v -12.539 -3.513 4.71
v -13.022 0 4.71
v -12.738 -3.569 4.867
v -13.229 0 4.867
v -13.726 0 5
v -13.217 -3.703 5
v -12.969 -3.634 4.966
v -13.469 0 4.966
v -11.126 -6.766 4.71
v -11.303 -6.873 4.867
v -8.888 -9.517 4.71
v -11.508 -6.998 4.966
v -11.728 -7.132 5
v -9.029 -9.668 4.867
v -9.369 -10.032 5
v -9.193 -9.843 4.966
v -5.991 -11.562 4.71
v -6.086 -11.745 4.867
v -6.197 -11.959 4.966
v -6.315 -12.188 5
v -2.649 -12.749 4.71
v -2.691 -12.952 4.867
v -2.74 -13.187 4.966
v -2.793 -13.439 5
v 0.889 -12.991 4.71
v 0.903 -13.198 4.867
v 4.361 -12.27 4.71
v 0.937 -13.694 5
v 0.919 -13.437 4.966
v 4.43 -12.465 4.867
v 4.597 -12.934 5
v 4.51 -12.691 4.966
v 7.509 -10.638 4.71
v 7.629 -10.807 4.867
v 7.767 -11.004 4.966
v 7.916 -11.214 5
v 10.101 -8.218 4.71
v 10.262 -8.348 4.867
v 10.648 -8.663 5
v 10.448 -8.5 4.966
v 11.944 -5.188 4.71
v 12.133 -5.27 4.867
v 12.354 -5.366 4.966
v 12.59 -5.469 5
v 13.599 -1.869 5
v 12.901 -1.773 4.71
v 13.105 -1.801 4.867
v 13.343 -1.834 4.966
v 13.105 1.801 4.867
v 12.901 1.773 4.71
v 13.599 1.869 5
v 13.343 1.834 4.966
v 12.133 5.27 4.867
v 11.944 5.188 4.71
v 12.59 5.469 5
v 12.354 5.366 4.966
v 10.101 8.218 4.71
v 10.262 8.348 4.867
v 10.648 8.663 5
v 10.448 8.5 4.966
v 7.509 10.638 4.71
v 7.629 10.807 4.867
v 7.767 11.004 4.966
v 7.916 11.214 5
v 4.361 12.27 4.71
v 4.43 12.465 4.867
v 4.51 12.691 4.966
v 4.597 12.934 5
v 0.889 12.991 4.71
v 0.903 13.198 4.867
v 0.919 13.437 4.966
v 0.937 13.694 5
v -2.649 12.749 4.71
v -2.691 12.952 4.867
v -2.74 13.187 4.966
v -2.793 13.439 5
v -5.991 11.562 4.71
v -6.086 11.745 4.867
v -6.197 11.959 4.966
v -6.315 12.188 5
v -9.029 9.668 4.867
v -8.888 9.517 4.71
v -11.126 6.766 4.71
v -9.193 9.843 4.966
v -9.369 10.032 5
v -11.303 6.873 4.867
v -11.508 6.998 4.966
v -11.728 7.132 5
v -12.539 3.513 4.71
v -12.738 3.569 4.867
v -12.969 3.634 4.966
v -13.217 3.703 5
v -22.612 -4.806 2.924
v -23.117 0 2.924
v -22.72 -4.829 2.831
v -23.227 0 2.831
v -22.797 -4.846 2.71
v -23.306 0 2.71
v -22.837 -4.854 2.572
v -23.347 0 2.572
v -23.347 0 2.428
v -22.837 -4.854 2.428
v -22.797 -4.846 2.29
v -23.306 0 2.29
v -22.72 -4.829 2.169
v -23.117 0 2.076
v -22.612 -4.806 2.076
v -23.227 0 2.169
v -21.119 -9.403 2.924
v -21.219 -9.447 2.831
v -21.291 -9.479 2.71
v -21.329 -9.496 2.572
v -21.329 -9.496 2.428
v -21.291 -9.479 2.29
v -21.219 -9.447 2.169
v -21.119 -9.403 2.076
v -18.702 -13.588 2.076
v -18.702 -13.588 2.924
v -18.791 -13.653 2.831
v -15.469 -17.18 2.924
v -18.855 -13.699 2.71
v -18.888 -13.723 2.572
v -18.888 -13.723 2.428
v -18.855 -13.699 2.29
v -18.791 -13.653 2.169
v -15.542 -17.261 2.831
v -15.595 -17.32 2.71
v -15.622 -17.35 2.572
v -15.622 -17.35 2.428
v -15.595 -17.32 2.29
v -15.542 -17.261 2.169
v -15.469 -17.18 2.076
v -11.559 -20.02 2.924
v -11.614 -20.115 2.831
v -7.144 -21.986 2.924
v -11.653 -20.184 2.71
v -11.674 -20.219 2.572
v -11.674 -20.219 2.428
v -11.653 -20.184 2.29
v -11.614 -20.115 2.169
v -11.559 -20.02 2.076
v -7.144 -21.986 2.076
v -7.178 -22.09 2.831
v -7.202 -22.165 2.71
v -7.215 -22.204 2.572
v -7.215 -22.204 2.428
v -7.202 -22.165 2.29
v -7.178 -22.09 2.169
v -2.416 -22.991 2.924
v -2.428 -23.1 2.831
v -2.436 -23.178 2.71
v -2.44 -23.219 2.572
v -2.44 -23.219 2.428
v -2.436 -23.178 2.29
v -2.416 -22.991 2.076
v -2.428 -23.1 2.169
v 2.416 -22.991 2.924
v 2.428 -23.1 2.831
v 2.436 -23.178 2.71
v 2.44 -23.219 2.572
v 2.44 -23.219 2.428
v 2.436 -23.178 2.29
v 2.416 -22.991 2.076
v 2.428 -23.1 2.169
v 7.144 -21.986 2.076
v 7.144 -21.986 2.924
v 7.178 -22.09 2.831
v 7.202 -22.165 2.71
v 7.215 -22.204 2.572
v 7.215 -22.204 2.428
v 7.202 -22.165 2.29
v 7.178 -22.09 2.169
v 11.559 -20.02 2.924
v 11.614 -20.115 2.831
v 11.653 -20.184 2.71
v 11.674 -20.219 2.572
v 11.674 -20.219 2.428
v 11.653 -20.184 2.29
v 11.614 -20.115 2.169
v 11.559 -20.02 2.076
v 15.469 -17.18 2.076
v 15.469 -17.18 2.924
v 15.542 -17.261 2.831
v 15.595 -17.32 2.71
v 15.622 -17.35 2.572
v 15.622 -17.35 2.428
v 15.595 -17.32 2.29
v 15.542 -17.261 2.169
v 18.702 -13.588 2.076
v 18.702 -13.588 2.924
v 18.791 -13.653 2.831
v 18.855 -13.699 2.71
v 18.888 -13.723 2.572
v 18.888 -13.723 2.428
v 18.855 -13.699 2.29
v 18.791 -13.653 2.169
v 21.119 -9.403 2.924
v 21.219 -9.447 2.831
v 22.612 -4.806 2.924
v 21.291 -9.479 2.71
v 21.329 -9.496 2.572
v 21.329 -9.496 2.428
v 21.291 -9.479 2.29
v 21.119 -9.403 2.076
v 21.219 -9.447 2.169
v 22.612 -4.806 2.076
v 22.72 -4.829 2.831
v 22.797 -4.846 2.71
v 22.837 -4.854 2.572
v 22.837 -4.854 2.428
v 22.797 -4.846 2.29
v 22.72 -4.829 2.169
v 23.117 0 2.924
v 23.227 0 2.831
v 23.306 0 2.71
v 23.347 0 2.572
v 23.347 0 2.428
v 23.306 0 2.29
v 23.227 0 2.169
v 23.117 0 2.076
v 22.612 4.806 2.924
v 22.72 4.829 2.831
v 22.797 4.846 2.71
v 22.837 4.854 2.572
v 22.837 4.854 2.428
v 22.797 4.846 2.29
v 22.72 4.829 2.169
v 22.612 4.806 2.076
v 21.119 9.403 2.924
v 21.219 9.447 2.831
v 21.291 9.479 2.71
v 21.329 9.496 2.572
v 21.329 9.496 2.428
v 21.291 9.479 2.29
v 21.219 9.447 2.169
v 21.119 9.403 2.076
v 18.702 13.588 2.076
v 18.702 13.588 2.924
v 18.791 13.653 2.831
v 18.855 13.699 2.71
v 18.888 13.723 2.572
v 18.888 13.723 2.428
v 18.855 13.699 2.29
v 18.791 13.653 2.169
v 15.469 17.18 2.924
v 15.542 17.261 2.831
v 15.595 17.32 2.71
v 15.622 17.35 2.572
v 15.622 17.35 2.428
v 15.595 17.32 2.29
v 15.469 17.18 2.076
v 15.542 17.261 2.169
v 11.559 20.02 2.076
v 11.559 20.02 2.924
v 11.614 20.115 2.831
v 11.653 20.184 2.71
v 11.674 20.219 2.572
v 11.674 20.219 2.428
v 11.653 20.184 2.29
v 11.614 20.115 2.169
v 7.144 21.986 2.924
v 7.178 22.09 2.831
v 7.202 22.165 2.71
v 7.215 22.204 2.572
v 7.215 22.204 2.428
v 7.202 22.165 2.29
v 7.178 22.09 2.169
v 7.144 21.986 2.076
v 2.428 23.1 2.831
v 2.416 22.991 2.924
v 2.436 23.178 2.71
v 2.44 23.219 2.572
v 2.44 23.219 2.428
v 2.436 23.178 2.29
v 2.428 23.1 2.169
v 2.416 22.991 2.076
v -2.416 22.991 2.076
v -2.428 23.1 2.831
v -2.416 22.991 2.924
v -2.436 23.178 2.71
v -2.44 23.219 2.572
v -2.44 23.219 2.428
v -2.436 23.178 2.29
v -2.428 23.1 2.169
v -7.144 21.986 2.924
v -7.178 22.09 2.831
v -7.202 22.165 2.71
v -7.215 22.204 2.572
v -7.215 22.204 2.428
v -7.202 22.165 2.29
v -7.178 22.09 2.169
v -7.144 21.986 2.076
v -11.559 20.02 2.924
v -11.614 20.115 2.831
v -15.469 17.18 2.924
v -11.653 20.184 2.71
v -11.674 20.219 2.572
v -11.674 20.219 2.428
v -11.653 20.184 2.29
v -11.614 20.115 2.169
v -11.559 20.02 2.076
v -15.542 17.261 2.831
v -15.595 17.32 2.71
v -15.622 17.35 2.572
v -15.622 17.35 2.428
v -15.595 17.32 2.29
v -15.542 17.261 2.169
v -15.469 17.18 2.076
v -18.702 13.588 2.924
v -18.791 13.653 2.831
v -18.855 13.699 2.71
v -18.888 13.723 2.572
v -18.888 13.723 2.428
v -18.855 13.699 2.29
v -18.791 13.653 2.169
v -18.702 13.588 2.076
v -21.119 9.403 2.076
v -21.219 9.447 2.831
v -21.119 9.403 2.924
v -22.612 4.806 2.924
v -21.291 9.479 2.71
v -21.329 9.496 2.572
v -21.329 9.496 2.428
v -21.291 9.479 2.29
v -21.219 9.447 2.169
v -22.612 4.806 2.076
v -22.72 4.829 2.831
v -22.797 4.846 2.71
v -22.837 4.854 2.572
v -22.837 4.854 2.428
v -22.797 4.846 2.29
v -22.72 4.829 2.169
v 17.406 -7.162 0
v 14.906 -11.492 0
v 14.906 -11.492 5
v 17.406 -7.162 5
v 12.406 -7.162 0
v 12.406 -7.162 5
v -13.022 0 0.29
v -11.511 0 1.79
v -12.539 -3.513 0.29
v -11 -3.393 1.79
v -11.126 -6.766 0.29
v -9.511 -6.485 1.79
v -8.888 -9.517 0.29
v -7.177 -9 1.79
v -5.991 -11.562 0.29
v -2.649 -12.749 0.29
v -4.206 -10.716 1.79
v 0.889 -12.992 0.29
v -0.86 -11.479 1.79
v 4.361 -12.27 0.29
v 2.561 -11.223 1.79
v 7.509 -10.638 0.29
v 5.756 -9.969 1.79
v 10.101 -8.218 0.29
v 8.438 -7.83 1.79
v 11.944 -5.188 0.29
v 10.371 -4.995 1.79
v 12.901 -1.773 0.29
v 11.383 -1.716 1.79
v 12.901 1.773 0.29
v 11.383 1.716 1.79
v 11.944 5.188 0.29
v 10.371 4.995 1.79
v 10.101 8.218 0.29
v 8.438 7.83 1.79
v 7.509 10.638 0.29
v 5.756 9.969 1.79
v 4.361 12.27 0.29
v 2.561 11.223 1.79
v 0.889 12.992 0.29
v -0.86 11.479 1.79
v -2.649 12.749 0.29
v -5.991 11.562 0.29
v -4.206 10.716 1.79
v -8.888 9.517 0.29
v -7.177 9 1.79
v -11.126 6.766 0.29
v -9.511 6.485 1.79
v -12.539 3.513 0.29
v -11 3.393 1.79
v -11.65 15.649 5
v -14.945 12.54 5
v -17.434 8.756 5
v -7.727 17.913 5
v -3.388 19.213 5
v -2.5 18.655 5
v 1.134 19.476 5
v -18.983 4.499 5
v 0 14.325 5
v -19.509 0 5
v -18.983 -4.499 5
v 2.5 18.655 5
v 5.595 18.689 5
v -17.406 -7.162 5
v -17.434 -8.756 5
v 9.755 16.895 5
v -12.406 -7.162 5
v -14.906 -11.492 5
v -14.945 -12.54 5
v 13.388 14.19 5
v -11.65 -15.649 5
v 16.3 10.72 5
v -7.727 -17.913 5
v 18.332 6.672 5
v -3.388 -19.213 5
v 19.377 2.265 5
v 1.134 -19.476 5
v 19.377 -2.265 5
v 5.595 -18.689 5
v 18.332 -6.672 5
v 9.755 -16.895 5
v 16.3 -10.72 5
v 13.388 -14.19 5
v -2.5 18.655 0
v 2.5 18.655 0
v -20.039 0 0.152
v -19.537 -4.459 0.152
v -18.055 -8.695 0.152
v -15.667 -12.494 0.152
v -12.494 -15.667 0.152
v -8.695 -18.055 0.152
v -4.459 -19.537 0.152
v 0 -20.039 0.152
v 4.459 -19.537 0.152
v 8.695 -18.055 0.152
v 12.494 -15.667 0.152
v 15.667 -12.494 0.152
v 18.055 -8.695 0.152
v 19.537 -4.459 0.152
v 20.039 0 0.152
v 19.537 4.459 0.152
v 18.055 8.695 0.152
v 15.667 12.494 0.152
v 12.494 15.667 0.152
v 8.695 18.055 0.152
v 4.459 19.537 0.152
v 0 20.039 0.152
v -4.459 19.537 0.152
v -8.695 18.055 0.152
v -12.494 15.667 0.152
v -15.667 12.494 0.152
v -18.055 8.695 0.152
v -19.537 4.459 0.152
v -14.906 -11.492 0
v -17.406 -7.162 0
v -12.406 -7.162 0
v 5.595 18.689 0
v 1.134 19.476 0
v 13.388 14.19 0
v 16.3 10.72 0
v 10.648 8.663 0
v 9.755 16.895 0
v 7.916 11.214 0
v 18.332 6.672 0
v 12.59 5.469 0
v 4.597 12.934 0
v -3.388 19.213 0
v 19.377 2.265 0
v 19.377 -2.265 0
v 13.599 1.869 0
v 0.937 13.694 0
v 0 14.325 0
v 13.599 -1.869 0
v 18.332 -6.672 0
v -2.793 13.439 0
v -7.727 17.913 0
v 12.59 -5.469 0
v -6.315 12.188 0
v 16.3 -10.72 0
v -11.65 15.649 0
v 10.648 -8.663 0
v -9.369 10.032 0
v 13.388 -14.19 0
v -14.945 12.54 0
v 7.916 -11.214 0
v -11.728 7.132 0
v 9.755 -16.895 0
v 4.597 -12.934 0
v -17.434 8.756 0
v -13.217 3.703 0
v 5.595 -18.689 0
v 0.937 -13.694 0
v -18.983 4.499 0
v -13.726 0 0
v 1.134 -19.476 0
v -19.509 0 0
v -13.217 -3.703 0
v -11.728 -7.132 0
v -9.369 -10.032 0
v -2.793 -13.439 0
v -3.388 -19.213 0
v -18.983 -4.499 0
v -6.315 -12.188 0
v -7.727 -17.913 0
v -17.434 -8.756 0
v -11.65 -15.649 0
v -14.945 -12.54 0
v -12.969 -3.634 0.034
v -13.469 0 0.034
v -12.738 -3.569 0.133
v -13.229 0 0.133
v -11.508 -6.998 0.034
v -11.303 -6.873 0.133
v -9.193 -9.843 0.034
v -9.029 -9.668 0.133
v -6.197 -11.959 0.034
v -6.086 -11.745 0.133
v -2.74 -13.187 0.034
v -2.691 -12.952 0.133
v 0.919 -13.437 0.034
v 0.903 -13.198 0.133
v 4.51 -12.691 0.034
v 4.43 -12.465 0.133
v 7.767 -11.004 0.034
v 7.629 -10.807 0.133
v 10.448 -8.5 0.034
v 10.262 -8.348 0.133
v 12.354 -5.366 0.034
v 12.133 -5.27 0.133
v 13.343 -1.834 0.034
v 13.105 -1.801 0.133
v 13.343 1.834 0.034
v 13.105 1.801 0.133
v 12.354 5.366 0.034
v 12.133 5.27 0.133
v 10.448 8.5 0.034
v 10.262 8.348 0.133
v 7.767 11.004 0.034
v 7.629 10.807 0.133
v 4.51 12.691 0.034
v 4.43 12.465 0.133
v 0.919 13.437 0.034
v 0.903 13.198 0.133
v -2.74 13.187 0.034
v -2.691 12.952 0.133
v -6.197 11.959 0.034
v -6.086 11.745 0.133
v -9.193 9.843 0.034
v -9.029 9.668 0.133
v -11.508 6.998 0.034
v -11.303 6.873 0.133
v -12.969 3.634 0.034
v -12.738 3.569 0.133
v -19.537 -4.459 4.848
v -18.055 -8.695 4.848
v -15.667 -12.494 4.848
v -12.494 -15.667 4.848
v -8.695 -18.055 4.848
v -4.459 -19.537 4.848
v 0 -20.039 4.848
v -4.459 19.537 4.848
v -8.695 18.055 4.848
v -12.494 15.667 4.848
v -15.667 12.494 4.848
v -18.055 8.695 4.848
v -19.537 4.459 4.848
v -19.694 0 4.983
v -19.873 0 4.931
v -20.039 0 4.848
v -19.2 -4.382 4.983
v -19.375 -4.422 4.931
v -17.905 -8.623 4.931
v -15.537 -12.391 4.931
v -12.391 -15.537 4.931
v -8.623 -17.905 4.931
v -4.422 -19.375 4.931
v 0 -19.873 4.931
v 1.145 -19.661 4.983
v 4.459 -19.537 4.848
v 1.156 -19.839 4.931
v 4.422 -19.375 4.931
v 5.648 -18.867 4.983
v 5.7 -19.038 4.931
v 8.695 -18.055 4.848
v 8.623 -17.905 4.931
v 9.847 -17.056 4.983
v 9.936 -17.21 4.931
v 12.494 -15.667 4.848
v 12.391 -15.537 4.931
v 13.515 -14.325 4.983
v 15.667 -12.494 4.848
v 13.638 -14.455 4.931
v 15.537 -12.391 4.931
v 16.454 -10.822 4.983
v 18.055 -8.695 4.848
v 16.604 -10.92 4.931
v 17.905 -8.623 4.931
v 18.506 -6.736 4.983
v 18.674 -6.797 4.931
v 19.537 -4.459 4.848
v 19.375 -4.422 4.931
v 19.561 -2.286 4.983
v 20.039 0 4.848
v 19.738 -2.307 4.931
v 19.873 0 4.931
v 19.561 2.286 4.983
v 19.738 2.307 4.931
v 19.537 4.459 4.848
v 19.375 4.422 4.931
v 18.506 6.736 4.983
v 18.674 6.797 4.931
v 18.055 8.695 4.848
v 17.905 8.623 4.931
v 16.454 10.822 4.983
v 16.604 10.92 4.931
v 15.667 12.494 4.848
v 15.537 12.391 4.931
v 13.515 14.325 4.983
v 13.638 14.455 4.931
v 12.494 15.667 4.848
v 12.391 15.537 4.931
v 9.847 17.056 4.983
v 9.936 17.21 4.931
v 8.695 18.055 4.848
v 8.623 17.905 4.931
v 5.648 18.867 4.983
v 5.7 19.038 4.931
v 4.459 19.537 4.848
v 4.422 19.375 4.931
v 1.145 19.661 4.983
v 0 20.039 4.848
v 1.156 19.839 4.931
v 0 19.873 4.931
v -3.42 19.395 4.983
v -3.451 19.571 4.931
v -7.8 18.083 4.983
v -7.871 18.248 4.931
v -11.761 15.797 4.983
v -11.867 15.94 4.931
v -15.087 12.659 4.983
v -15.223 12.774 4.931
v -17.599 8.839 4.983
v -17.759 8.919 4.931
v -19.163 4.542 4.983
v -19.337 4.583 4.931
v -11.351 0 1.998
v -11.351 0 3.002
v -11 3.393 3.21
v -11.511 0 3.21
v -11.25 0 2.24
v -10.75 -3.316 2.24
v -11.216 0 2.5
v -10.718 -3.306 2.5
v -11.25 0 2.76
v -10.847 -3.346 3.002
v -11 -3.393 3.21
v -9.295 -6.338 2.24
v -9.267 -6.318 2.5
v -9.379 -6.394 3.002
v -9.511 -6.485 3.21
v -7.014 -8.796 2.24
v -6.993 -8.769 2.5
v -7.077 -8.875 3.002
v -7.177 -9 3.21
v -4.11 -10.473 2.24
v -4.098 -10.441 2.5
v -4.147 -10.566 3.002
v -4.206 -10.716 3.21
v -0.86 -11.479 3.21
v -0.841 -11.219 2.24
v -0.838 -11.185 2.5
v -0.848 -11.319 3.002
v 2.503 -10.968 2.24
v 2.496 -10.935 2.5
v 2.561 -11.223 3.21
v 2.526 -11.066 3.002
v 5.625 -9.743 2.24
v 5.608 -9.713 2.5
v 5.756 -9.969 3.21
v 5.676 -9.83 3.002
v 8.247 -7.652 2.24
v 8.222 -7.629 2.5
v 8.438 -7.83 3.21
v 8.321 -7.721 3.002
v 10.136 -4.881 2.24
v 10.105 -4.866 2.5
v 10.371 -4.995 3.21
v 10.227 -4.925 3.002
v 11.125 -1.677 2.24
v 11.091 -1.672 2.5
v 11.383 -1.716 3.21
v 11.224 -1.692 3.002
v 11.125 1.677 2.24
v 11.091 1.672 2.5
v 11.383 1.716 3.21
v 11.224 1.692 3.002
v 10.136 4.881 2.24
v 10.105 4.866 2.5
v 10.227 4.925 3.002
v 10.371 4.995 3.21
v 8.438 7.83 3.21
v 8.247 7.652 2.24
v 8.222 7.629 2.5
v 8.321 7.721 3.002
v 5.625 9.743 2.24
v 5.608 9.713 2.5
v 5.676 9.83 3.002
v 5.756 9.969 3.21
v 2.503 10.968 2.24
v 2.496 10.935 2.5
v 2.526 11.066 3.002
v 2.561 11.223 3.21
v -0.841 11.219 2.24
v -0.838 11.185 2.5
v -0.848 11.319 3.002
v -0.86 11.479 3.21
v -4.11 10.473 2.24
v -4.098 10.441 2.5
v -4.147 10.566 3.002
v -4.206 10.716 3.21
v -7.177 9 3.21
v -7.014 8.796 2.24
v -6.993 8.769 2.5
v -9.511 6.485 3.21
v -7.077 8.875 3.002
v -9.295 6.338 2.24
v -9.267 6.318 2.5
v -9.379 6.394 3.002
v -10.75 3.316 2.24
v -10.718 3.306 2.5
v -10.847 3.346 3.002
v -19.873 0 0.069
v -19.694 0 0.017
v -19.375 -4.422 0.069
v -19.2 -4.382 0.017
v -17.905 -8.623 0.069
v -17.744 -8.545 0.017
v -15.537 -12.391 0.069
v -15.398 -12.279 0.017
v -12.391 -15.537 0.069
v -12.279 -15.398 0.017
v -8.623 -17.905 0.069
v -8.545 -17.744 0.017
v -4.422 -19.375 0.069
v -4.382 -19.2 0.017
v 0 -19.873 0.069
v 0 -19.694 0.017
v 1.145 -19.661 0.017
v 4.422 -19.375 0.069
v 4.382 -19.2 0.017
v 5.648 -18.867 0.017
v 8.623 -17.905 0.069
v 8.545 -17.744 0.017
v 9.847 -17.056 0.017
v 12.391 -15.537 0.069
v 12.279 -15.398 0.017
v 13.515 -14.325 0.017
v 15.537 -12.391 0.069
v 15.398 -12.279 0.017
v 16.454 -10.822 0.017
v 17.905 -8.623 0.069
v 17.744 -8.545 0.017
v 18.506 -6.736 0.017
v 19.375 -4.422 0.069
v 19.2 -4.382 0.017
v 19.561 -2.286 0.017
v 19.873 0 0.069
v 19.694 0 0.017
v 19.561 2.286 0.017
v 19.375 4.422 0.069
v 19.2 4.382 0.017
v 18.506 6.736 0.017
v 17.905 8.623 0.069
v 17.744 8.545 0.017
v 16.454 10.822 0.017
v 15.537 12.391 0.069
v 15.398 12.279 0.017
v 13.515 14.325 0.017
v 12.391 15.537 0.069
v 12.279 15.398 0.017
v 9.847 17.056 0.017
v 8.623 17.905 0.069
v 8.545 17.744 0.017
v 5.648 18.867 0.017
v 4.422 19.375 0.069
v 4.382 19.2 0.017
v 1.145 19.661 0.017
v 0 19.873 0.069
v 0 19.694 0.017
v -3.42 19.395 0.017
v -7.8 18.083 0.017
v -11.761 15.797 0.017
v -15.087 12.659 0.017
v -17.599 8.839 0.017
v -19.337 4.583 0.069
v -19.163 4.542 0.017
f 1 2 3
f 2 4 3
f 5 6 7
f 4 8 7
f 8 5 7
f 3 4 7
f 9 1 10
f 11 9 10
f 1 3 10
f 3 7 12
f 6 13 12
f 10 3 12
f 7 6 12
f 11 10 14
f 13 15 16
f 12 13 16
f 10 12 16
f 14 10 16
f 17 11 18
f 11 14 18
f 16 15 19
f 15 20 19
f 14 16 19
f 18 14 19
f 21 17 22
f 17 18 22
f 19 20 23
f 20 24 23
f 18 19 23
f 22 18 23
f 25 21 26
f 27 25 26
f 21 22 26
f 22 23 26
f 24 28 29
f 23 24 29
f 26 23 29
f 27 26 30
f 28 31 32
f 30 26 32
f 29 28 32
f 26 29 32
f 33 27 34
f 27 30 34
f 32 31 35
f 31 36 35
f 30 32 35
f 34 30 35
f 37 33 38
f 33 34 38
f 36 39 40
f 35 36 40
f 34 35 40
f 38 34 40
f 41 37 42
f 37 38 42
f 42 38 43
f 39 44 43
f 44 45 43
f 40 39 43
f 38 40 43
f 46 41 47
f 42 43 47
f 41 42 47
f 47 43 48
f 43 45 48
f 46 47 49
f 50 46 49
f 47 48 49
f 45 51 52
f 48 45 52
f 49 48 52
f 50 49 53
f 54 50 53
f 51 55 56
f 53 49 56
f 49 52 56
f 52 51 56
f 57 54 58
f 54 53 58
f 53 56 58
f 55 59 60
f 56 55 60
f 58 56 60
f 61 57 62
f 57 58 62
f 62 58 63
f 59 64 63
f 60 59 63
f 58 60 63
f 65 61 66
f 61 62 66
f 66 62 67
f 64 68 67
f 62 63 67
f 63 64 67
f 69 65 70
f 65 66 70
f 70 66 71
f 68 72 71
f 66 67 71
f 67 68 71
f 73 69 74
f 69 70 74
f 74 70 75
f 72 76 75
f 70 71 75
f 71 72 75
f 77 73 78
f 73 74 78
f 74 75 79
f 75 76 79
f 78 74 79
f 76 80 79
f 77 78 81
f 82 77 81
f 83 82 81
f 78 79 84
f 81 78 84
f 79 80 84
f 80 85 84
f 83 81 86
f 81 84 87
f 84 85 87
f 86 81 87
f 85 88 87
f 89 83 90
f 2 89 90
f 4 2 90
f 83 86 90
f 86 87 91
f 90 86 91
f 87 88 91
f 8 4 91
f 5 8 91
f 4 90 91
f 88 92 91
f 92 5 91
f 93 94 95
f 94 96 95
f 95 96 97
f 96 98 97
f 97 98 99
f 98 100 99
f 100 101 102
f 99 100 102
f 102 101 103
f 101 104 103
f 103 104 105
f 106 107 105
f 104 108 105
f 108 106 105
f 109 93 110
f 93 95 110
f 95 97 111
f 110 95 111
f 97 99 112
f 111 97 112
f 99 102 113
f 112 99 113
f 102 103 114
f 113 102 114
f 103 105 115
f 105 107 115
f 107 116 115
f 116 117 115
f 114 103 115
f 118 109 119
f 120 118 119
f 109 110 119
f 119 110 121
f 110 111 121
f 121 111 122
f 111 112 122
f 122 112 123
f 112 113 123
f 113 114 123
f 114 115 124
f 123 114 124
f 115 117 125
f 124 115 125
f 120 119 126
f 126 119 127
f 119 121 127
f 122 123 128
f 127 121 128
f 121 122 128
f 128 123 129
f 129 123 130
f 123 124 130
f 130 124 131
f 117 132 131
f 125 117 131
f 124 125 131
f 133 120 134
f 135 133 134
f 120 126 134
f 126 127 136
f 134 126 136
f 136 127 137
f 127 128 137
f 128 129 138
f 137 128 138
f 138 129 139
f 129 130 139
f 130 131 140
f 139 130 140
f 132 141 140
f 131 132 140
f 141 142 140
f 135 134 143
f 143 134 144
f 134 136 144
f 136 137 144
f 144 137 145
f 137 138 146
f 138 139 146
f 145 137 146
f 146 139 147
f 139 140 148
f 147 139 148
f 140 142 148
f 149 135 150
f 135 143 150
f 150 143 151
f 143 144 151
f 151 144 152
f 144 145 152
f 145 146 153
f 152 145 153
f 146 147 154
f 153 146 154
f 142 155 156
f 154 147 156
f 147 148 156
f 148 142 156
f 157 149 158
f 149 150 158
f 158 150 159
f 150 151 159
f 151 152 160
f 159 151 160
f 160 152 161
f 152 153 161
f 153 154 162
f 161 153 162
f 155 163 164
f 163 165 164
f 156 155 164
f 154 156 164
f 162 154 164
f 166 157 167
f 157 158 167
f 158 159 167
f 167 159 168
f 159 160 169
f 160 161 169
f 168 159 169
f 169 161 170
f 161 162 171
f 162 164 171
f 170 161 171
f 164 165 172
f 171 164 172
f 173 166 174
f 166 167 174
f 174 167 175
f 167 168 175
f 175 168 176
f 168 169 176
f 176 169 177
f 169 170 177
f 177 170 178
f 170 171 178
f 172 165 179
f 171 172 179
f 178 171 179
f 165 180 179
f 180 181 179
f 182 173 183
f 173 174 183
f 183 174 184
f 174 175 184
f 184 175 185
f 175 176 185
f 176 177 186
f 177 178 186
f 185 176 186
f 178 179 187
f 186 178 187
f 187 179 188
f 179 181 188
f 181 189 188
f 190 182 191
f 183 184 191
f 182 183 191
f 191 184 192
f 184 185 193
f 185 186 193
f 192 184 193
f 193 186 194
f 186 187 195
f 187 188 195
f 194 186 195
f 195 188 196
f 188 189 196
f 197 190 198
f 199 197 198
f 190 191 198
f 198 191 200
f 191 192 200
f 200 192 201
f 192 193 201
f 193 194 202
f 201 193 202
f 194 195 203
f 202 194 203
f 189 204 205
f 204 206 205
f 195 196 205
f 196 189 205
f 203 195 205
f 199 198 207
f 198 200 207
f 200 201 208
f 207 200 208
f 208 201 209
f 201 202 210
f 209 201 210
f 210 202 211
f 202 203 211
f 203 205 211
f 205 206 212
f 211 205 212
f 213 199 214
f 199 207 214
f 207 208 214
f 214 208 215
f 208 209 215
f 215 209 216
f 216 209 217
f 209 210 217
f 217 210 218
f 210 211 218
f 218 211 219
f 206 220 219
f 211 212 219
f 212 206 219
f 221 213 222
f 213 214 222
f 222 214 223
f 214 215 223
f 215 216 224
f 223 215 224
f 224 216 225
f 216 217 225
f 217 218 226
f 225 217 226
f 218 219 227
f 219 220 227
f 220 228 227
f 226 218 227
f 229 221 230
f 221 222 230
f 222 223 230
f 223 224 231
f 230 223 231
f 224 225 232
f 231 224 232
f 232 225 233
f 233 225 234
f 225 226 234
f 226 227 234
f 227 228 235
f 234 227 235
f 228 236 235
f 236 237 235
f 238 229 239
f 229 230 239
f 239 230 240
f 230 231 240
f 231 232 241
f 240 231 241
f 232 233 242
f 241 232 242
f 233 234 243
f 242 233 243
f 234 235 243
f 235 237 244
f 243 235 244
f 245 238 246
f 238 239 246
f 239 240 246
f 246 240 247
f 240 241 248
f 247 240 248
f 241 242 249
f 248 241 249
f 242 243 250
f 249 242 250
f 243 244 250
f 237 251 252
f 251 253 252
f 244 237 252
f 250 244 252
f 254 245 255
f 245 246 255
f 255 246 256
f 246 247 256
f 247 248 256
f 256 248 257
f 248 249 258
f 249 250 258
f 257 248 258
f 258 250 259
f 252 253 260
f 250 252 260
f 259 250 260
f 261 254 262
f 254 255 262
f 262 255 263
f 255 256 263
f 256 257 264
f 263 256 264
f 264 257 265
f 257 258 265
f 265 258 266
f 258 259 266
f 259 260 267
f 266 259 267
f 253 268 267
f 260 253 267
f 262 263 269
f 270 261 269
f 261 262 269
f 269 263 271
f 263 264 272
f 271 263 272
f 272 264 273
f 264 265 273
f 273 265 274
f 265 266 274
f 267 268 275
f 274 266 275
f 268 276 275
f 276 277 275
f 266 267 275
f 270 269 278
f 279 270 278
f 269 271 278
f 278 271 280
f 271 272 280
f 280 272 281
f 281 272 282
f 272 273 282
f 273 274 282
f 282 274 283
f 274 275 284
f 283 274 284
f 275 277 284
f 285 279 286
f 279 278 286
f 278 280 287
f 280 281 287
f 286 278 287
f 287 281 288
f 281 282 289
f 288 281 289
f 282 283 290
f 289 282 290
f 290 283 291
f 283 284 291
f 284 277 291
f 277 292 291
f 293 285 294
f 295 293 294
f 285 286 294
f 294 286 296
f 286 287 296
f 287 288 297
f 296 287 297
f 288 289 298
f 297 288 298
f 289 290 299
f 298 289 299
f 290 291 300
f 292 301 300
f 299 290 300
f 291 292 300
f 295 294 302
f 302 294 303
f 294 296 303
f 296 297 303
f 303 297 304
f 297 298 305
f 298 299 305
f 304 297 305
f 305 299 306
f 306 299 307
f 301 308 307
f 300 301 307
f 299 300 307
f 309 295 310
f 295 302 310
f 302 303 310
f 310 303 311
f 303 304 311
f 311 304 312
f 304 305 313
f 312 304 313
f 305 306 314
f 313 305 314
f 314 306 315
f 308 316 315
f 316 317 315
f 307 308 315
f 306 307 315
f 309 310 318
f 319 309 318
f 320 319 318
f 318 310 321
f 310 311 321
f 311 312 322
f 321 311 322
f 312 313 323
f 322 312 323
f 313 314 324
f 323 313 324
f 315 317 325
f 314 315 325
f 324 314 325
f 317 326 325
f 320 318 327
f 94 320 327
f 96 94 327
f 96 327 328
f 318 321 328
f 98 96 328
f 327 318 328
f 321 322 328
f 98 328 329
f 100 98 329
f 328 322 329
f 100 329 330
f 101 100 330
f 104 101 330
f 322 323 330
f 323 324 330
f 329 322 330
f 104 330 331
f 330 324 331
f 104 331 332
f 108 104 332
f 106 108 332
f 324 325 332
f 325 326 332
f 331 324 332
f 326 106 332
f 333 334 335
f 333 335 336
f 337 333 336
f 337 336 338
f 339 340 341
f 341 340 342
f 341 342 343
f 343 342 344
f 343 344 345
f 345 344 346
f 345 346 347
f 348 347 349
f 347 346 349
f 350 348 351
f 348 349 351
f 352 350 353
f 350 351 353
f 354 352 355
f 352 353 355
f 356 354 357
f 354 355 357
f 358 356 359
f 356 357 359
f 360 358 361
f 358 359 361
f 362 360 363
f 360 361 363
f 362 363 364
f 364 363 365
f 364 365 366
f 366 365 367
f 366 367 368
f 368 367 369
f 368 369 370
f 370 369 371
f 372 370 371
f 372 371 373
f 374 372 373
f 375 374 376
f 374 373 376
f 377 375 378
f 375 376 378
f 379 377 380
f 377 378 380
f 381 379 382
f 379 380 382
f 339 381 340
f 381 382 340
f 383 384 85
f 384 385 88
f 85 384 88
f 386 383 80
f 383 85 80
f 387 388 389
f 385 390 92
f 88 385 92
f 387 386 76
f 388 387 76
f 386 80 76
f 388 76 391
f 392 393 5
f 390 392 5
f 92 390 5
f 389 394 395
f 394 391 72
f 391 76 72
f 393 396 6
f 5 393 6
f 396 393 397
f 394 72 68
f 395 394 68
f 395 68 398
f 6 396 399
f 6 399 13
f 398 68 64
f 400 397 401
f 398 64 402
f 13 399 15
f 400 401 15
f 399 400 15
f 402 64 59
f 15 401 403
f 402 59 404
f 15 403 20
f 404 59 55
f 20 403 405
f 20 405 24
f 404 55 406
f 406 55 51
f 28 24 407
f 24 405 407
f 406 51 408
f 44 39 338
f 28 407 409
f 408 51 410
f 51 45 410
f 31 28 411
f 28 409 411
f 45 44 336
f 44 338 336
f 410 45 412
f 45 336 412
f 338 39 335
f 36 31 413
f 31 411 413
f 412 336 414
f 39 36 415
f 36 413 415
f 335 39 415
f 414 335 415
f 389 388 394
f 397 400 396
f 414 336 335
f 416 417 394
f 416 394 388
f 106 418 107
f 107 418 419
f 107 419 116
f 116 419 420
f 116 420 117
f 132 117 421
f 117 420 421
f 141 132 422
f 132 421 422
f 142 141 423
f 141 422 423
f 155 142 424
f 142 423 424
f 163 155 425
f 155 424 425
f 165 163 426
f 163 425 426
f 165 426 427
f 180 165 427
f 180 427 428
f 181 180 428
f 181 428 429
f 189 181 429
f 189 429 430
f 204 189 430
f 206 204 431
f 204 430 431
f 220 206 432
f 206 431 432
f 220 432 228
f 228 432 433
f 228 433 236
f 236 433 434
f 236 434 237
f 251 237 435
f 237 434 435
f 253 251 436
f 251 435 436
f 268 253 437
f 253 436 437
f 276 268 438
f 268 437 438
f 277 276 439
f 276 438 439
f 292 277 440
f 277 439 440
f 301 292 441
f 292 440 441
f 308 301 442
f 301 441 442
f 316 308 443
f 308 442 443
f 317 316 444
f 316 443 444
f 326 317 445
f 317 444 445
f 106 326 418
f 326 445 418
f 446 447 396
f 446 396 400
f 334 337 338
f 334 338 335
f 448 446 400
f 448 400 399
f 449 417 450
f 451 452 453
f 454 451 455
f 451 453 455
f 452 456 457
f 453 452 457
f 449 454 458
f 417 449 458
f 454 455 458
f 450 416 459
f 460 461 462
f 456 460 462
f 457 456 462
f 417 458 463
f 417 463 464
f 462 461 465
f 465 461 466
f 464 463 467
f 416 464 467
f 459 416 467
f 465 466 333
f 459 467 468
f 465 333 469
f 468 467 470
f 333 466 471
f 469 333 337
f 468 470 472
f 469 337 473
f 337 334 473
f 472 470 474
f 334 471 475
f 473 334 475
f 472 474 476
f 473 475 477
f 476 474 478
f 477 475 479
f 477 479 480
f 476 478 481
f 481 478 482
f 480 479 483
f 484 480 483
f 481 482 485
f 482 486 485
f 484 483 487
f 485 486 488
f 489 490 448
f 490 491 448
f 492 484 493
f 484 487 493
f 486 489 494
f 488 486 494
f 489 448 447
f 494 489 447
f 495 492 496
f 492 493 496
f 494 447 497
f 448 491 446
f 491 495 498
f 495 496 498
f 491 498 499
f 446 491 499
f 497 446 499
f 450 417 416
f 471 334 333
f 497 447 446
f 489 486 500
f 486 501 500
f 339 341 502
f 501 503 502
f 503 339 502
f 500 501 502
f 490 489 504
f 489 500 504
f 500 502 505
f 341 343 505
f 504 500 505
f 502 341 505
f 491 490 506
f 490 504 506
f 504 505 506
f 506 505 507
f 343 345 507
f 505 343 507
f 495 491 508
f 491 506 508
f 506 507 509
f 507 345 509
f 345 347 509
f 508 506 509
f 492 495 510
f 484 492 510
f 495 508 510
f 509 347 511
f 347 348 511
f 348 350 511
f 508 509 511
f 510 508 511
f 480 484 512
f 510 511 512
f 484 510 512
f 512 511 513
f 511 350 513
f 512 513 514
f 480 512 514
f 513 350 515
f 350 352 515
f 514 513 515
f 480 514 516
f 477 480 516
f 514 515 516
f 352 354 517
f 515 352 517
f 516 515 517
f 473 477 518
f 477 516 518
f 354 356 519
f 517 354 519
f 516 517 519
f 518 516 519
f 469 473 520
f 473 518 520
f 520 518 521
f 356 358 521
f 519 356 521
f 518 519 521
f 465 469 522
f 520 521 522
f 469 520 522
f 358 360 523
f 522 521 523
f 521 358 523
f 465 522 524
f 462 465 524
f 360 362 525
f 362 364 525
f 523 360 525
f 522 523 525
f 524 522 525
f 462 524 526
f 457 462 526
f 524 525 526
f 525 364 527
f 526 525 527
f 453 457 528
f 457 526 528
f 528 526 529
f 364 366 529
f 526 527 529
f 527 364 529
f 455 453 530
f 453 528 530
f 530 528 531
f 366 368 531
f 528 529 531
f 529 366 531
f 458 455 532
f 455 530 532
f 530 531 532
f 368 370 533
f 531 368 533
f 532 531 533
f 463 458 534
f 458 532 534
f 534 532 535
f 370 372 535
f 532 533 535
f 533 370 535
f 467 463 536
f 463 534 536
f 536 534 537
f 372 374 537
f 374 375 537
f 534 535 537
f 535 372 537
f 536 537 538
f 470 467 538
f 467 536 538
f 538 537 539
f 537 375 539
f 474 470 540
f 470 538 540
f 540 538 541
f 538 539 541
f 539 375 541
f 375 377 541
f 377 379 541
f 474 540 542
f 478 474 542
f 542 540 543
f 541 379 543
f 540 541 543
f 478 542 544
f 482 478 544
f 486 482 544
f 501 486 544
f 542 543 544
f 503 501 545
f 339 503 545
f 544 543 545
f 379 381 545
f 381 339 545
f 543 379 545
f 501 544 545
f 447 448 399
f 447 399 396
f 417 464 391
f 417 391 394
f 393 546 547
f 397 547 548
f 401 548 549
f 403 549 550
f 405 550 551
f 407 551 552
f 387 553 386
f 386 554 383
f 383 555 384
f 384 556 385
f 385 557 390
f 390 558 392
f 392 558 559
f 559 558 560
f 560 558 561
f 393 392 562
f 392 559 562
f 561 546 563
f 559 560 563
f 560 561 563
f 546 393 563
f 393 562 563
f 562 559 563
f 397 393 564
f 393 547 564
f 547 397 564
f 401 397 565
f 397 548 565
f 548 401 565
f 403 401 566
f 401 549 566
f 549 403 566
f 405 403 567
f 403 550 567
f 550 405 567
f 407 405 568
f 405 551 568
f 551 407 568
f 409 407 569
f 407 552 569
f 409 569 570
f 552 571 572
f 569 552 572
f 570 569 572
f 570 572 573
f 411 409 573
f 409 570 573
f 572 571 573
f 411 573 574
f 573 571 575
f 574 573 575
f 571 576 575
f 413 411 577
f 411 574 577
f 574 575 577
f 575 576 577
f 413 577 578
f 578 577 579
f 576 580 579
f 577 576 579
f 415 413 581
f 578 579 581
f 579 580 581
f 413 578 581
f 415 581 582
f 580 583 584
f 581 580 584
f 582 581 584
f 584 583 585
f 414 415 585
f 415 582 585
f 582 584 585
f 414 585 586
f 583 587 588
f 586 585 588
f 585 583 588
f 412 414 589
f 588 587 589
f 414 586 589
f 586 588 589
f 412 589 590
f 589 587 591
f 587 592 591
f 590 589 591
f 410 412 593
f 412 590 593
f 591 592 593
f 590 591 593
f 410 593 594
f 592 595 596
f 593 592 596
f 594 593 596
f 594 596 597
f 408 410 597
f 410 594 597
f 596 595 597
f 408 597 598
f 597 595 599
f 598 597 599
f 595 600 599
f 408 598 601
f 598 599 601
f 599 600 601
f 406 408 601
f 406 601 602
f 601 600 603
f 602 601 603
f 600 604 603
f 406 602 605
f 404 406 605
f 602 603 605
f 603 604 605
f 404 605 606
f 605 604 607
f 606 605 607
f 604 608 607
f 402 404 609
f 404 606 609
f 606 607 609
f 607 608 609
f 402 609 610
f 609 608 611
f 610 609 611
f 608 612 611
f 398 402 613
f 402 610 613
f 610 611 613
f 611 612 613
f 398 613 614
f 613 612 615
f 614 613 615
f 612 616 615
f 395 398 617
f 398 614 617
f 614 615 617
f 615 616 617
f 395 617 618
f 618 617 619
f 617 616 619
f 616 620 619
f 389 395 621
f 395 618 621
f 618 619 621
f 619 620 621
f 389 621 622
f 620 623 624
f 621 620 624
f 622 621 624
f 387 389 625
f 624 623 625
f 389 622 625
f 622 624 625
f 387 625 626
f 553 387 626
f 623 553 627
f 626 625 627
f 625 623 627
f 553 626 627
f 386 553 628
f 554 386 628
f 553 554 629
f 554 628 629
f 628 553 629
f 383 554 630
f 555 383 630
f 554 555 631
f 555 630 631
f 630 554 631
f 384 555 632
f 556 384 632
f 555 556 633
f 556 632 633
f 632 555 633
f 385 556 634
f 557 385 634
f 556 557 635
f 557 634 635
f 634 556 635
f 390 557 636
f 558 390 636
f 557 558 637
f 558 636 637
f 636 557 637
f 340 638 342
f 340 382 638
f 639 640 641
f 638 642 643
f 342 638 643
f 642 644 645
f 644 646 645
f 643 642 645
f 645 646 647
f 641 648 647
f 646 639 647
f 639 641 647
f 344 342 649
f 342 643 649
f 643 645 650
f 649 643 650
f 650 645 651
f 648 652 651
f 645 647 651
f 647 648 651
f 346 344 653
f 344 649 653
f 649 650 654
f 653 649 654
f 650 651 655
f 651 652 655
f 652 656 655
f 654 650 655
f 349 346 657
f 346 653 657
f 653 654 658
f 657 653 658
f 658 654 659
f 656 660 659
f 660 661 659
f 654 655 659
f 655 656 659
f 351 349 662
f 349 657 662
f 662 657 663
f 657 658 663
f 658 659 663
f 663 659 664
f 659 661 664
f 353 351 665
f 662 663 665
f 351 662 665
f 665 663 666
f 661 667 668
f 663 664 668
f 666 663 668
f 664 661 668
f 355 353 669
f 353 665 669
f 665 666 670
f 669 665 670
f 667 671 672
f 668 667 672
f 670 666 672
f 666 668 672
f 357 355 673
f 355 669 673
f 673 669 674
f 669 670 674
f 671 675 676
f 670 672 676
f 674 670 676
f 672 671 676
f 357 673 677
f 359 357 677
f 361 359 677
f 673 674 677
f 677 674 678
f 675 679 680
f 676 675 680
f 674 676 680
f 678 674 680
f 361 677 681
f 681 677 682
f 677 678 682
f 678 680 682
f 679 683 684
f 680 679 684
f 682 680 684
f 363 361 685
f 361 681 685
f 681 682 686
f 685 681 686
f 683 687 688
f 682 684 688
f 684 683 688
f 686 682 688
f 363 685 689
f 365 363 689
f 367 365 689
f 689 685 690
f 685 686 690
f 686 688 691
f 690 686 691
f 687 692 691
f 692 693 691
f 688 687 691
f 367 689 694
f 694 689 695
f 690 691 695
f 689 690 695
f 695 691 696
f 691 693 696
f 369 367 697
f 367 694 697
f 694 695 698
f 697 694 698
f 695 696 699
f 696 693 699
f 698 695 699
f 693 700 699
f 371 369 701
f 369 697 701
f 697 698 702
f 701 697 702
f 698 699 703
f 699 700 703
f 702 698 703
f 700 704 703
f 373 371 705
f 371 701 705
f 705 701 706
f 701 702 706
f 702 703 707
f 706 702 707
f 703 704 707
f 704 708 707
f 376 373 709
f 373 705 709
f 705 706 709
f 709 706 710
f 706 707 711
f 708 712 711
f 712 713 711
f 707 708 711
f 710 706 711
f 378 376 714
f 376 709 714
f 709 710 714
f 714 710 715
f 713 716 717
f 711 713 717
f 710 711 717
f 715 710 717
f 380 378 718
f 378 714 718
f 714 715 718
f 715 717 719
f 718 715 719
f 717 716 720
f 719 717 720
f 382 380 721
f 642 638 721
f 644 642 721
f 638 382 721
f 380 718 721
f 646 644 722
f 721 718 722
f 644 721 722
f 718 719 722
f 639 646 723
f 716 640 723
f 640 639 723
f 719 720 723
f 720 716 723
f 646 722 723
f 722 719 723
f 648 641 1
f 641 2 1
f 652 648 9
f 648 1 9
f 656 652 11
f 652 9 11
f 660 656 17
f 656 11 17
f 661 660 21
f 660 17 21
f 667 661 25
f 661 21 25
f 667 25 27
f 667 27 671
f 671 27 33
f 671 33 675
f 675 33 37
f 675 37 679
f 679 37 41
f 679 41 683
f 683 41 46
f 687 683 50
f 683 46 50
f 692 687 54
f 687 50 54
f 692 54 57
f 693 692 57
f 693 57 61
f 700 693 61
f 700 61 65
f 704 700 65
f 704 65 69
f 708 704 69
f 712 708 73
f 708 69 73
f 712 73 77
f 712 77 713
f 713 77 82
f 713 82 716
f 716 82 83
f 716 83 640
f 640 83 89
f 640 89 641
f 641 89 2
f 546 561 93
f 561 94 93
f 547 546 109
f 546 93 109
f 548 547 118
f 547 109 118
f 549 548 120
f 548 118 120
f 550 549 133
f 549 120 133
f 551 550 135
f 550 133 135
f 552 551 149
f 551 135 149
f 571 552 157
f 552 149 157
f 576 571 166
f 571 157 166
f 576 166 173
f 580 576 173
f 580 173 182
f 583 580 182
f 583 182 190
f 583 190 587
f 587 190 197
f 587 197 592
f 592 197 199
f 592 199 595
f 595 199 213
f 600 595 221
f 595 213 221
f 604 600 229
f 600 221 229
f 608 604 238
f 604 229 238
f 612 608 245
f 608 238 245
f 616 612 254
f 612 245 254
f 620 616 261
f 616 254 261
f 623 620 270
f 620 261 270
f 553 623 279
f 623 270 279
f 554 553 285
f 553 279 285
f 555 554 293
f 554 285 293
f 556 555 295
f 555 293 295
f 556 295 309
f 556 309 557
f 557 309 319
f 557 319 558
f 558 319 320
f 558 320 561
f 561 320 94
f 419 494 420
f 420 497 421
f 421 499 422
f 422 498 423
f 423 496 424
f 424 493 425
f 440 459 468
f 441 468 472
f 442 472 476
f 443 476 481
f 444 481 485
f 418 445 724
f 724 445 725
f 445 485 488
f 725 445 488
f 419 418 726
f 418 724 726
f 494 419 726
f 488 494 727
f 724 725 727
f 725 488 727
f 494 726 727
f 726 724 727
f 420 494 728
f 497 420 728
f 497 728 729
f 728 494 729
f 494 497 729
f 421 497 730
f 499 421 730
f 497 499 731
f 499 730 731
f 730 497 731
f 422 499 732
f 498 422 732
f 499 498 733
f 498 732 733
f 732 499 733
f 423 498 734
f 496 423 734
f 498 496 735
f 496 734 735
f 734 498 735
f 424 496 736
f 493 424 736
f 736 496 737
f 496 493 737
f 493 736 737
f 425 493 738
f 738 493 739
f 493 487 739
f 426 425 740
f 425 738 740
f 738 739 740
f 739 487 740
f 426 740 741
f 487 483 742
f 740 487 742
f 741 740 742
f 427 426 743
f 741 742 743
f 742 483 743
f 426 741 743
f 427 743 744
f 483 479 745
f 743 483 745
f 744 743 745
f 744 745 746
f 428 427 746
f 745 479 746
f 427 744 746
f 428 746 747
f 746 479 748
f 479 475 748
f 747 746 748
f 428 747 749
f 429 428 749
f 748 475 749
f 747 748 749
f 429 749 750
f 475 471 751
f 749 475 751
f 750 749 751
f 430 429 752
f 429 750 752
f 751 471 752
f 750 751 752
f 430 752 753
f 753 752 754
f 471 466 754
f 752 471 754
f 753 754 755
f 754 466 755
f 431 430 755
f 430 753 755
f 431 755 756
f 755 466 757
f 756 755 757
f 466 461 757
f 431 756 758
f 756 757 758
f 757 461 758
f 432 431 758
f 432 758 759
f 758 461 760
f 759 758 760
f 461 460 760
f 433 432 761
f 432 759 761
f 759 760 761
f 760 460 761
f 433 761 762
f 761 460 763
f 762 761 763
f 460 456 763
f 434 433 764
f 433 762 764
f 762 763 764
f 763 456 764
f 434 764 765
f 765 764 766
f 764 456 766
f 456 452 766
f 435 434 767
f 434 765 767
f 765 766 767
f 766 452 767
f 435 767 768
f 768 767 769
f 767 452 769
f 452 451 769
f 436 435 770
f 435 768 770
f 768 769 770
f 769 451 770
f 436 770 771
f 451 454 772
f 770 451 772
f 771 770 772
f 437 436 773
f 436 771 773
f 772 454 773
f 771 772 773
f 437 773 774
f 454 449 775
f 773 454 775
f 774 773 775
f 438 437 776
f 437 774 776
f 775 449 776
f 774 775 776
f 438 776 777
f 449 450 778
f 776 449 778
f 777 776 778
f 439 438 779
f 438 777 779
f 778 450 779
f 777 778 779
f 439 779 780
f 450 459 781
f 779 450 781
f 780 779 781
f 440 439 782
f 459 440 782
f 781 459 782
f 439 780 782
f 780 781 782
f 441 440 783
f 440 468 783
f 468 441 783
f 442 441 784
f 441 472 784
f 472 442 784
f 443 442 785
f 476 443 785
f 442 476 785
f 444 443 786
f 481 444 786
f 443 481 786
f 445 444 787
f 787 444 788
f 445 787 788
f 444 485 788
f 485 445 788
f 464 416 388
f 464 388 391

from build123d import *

# Parameters (mm, degrees)
F4_DEPTH = 25


with BuildPart() as f2:
    # F0 (on Front) → F2 (revolve)
    with BuildSketch(Plane.XZ):
        with BuildLine():
            Line((-13.726478, 5), (-19.509004, 5))
            ThreePointArc((-19.509004, 5), (-19.784693, 4.961247), (-20.039014, 4.847991))
            Line((-20.039014, 4.847991), (-23.117382, 2.923956))
            ThreePointArc((-23.117382, 2.923956), (-23.352377, 2.499956), (-23.117375, 2.07596))
            Line((-23.117375, 2.07596), (-20.039018, 0.152))
            ThreePointArc((-20.039018, 0.152), (-19.784703, 0.038751), (-19.509022, 0))
            Line((-19.509022, 0), (-13.726467, 0))
            ThreePointArc((-13.726467, 0), (-13.345413, 0.075447), (-13.021858, 0.290404))
            Line((-13.021858, 0.290404), (-11.511276, 1.79037))
            ThreePointArc((-11.511276, 1.79037), (-11.215885, 2.499957), (-11.511263, 3.209549))
            Line((-11.511263, 3.209549), (-13.021856, 4.709582))
            ThreePointArc((-13.021856, 4.709582), (-13.345416, 4.924549), (-13.726478, 5))
        make_face()
    revolve(axis=Axis((0, 0, 36.743954), (0, 0, 1)))

    # F3 (on Top) → F4 (cut)
    with BuildSketch(Plane.XY):
        Polygon((2.5, 18.654833), (-2.5, 18.654833), (0, 14.324706), align=None)
        Polygon((-12.40556, -7.162353), (-17.40556, -7.162353), (-14.90556, -11.49248), align=None)
        Polygon((12.40556, -7.162353), (14.90556, -11.49248), (17.40556, -7.162353), align=None)
    extrude(amount=F4_DEPTH, mode=Mode.SUBTRACT)


solid = f2.part
